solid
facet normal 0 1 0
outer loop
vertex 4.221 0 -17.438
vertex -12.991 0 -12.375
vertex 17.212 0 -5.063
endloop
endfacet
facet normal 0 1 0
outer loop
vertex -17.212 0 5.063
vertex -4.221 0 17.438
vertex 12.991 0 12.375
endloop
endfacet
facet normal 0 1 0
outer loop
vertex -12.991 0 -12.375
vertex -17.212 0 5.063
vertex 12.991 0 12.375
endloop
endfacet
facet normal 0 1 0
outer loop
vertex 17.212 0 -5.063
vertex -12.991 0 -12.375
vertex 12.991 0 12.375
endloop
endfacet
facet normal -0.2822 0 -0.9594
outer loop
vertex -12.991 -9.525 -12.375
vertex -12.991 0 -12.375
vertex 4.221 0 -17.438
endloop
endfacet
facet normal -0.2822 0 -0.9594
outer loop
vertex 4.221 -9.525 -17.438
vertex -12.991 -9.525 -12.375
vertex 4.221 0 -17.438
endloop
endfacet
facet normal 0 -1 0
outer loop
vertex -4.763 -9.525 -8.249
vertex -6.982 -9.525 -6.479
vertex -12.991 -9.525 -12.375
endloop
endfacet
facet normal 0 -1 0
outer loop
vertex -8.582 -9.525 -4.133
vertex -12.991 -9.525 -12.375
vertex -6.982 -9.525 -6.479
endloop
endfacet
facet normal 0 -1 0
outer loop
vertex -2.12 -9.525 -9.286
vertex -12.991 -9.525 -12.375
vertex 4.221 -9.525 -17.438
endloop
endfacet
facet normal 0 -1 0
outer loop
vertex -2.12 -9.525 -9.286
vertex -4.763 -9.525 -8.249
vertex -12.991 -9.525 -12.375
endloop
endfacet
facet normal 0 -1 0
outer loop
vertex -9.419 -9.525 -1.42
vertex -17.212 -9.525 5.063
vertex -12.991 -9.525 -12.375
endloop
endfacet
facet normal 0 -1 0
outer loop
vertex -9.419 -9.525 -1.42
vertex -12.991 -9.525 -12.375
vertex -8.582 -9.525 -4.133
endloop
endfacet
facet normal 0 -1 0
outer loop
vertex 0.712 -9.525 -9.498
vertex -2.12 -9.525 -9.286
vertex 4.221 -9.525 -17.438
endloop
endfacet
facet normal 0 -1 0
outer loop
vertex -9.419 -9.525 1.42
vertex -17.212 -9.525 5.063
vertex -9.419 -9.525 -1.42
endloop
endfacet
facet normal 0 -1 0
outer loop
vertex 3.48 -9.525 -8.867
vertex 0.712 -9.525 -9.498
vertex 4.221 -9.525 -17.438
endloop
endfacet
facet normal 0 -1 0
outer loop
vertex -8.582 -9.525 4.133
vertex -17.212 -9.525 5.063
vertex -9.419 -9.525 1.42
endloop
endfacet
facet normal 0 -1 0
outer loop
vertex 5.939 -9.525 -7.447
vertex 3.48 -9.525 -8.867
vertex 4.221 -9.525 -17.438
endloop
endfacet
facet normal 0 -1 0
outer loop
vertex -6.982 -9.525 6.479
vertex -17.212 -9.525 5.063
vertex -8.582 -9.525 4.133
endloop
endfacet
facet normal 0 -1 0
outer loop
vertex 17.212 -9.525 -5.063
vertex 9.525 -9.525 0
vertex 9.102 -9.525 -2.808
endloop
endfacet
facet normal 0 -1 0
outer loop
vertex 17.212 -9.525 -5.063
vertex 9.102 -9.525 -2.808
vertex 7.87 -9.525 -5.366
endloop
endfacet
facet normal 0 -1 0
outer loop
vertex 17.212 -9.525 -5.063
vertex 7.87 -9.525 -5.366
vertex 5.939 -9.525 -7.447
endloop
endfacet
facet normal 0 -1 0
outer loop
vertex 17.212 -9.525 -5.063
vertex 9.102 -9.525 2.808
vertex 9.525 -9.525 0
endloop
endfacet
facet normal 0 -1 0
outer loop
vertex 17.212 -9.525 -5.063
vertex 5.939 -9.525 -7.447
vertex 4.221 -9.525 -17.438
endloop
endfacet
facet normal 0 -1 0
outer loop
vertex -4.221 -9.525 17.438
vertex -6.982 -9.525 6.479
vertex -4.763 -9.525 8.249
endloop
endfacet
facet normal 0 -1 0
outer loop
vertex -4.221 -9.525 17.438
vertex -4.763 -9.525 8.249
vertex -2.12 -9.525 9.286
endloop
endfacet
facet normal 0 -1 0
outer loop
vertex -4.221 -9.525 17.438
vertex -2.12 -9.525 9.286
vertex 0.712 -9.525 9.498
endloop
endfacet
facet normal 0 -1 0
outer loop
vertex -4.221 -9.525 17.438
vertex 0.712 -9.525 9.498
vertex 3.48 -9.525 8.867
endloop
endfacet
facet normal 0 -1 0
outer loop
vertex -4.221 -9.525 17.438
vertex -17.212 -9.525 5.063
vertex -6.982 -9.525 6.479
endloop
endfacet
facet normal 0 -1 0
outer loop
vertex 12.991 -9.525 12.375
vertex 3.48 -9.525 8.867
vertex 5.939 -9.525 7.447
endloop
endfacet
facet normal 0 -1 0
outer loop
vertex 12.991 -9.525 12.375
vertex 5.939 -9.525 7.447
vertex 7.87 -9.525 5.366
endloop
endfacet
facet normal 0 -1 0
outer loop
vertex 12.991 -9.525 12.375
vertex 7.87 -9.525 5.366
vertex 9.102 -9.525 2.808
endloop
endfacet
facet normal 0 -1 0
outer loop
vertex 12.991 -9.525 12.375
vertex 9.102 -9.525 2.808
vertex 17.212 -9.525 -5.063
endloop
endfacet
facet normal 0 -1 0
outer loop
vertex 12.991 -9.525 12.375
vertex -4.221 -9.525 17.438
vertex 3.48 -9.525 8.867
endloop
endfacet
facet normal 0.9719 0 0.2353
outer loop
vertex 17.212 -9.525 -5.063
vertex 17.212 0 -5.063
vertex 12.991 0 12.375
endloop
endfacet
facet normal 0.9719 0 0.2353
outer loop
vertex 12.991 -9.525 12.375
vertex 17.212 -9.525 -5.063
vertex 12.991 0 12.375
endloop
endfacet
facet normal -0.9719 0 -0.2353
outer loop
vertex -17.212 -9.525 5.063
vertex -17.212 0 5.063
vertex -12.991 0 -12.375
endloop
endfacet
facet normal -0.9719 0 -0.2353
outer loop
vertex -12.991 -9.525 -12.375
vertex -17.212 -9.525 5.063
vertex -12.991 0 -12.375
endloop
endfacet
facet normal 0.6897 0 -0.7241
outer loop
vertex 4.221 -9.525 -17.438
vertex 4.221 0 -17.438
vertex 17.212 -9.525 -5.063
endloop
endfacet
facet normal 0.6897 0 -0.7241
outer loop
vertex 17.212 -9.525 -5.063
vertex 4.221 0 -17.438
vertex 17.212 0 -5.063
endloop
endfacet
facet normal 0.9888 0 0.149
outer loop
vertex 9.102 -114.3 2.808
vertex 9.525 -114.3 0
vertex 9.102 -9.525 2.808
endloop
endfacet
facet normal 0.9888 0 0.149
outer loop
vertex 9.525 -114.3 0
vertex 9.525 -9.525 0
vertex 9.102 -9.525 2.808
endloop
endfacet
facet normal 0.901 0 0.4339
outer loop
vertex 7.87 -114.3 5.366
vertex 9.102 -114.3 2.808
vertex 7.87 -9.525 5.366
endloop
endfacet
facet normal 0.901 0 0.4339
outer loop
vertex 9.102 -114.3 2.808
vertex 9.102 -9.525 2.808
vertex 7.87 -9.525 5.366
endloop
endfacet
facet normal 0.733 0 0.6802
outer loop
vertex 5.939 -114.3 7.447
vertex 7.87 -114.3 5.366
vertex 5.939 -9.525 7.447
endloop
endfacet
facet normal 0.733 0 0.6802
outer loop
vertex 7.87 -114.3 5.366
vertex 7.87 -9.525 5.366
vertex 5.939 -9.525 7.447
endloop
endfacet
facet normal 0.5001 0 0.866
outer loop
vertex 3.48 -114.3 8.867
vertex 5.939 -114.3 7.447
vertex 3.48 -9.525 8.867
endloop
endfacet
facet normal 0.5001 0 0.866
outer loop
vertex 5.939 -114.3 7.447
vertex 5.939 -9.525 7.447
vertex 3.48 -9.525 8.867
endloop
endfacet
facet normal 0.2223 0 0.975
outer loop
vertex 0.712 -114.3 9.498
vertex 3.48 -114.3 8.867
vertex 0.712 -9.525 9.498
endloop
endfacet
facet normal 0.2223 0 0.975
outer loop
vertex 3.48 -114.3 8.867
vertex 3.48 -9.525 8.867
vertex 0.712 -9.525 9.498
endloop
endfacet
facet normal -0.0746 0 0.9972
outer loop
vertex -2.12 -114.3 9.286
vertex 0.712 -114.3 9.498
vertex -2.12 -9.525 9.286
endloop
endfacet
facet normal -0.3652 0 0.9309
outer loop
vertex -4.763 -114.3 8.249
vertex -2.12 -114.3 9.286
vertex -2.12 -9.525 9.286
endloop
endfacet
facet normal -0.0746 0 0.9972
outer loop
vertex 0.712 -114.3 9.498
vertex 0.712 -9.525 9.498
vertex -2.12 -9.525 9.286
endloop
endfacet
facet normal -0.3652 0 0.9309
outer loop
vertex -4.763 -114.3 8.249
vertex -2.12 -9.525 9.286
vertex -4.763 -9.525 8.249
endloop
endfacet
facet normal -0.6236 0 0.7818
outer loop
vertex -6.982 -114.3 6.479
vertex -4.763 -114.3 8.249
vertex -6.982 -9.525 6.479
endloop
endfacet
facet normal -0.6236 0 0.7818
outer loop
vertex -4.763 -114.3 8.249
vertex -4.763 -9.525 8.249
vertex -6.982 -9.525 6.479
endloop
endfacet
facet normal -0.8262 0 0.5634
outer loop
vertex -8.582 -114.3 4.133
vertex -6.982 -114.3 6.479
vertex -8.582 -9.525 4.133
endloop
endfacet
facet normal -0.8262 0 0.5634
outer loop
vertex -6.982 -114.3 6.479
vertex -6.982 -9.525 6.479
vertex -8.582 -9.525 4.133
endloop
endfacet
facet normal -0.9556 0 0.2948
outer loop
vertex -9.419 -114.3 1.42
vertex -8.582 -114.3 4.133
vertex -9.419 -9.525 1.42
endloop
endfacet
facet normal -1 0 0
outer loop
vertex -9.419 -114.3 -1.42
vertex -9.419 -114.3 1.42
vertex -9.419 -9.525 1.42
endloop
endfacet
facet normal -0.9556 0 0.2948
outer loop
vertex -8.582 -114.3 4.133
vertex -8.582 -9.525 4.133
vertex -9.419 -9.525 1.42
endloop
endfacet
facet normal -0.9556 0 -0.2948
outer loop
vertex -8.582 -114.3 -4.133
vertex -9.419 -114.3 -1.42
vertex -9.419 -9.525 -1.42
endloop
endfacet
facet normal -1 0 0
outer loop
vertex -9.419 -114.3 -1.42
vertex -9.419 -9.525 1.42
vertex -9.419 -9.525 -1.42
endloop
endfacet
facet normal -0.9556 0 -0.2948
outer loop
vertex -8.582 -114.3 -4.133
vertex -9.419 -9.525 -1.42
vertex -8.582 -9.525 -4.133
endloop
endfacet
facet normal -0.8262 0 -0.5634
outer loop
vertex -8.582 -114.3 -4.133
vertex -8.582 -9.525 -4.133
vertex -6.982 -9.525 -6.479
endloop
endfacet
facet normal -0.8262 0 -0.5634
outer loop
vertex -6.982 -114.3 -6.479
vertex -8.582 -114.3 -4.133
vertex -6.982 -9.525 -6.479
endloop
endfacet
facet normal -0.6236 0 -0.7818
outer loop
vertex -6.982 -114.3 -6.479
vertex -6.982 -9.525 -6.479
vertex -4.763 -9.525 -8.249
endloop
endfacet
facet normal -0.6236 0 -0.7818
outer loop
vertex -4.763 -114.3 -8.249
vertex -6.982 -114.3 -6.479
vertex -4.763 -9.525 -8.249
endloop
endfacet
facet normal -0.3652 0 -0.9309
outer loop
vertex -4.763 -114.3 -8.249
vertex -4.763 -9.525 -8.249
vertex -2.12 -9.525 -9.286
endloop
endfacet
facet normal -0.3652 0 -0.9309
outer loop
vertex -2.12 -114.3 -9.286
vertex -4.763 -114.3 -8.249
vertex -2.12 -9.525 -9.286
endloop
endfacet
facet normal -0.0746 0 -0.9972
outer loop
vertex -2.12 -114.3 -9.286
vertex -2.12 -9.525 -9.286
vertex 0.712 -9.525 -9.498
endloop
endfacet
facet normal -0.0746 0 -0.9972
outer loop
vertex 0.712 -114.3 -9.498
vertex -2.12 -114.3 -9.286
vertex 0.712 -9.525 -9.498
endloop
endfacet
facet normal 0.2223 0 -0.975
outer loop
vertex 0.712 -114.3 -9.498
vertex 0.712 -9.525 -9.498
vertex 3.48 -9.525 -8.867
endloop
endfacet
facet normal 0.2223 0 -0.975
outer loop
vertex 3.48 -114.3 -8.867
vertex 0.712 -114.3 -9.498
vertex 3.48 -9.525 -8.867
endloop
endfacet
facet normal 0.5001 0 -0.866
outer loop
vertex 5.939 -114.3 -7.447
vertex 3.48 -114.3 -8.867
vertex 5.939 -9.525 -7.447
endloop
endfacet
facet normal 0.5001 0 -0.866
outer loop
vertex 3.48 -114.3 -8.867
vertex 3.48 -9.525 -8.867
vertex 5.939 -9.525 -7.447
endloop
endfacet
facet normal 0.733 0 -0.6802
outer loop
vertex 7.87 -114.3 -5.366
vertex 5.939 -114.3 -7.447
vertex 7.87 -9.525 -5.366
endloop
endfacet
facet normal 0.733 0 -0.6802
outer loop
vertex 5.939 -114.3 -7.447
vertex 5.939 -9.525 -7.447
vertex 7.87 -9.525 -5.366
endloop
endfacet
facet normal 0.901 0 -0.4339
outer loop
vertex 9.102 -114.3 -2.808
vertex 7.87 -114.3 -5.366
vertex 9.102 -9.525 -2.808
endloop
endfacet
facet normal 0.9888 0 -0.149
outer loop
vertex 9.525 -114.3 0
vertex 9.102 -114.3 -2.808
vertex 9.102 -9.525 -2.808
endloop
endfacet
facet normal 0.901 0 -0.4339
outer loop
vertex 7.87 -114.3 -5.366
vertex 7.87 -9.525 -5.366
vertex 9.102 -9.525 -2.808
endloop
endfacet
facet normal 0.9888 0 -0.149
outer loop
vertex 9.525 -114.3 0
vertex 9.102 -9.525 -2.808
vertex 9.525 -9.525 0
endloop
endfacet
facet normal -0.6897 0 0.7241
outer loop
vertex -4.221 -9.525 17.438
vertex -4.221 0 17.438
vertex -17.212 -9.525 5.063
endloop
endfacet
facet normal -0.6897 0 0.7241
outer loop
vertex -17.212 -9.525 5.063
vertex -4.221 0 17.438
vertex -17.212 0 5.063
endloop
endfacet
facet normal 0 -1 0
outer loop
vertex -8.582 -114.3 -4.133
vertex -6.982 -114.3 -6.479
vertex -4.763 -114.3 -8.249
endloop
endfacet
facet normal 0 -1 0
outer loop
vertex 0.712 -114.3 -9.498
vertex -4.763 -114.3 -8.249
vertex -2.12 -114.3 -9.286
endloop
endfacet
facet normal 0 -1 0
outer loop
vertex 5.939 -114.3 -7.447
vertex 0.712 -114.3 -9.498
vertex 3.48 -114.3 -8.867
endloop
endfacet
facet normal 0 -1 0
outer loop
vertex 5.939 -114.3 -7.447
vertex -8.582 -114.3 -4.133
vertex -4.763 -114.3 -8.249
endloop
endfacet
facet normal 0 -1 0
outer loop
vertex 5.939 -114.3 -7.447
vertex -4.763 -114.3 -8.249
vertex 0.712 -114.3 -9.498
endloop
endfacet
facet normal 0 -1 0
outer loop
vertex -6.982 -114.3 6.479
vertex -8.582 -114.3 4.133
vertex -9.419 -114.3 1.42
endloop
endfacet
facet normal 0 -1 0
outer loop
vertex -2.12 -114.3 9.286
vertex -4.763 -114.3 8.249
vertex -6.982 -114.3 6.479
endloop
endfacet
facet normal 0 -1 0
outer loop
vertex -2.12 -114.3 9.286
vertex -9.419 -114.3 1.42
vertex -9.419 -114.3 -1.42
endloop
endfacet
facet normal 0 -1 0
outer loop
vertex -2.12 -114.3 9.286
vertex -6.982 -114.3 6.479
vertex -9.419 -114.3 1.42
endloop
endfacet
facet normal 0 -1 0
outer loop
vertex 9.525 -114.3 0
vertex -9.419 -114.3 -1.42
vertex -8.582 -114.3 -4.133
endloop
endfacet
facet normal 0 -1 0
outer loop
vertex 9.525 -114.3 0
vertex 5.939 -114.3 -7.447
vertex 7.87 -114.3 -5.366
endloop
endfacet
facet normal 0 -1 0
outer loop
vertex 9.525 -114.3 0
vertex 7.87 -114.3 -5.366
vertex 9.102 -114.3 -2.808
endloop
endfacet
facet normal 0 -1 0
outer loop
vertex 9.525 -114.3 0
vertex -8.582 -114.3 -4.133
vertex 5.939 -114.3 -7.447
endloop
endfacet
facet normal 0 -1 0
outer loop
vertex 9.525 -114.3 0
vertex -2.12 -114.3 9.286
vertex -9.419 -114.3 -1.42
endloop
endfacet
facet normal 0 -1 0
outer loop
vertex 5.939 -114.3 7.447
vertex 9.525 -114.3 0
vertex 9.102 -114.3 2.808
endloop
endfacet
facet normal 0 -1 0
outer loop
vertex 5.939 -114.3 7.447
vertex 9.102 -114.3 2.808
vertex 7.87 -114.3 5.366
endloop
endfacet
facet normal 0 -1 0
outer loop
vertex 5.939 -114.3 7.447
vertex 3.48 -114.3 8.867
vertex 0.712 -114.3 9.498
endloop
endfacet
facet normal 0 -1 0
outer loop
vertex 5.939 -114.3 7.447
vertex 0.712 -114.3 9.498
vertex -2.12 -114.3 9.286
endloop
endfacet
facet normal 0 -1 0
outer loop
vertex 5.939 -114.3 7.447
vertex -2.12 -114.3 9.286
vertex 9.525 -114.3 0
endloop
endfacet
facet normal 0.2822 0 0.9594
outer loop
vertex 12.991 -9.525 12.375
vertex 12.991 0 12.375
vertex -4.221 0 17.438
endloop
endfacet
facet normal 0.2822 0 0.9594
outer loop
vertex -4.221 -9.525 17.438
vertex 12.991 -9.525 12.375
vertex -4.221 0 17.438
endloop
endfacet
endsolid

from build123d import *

# Parameters (mm, degrees)
F0_R     = 9.525
F1_DEPTH = 9.525
F2_DEPTH = 88.9
F3_DEPTH = 25.4


with BuildPart() as f1:
    # F0 (on Front) → F1 (new body)
    with BuildSketch(Plane.XZ):
        Polygon((-4.2214523455, 17.4378681917), (-17.2123630146, 5.0630491238), (-12.9909106691, -12.3748190679), (4.2214523455, -17.4378681917), (17.2123630146, -5.0630491238), (12.9909106691, 12.3748190679), align=None)
        Circle(F0_R, mode=Mode.SUBTRACT)
        Circle(F0_R)
    extrude(amount=F1_DEPTH)

    # F0 (on Front) → F2 (join)
    with BuildSketch(Plane.XZ):
        Circle(F0_R)
    extrude(amount=F2_DEPTH)

    # F3 (add): a face of the model
    f3_faces = [f1.faces().sort_by_distance(p)[0] for p in [
        (0, -88.9, 0),
    ]]
    extrude(f3_faces, amount=F3_DEPTH)


solid = f1.part
